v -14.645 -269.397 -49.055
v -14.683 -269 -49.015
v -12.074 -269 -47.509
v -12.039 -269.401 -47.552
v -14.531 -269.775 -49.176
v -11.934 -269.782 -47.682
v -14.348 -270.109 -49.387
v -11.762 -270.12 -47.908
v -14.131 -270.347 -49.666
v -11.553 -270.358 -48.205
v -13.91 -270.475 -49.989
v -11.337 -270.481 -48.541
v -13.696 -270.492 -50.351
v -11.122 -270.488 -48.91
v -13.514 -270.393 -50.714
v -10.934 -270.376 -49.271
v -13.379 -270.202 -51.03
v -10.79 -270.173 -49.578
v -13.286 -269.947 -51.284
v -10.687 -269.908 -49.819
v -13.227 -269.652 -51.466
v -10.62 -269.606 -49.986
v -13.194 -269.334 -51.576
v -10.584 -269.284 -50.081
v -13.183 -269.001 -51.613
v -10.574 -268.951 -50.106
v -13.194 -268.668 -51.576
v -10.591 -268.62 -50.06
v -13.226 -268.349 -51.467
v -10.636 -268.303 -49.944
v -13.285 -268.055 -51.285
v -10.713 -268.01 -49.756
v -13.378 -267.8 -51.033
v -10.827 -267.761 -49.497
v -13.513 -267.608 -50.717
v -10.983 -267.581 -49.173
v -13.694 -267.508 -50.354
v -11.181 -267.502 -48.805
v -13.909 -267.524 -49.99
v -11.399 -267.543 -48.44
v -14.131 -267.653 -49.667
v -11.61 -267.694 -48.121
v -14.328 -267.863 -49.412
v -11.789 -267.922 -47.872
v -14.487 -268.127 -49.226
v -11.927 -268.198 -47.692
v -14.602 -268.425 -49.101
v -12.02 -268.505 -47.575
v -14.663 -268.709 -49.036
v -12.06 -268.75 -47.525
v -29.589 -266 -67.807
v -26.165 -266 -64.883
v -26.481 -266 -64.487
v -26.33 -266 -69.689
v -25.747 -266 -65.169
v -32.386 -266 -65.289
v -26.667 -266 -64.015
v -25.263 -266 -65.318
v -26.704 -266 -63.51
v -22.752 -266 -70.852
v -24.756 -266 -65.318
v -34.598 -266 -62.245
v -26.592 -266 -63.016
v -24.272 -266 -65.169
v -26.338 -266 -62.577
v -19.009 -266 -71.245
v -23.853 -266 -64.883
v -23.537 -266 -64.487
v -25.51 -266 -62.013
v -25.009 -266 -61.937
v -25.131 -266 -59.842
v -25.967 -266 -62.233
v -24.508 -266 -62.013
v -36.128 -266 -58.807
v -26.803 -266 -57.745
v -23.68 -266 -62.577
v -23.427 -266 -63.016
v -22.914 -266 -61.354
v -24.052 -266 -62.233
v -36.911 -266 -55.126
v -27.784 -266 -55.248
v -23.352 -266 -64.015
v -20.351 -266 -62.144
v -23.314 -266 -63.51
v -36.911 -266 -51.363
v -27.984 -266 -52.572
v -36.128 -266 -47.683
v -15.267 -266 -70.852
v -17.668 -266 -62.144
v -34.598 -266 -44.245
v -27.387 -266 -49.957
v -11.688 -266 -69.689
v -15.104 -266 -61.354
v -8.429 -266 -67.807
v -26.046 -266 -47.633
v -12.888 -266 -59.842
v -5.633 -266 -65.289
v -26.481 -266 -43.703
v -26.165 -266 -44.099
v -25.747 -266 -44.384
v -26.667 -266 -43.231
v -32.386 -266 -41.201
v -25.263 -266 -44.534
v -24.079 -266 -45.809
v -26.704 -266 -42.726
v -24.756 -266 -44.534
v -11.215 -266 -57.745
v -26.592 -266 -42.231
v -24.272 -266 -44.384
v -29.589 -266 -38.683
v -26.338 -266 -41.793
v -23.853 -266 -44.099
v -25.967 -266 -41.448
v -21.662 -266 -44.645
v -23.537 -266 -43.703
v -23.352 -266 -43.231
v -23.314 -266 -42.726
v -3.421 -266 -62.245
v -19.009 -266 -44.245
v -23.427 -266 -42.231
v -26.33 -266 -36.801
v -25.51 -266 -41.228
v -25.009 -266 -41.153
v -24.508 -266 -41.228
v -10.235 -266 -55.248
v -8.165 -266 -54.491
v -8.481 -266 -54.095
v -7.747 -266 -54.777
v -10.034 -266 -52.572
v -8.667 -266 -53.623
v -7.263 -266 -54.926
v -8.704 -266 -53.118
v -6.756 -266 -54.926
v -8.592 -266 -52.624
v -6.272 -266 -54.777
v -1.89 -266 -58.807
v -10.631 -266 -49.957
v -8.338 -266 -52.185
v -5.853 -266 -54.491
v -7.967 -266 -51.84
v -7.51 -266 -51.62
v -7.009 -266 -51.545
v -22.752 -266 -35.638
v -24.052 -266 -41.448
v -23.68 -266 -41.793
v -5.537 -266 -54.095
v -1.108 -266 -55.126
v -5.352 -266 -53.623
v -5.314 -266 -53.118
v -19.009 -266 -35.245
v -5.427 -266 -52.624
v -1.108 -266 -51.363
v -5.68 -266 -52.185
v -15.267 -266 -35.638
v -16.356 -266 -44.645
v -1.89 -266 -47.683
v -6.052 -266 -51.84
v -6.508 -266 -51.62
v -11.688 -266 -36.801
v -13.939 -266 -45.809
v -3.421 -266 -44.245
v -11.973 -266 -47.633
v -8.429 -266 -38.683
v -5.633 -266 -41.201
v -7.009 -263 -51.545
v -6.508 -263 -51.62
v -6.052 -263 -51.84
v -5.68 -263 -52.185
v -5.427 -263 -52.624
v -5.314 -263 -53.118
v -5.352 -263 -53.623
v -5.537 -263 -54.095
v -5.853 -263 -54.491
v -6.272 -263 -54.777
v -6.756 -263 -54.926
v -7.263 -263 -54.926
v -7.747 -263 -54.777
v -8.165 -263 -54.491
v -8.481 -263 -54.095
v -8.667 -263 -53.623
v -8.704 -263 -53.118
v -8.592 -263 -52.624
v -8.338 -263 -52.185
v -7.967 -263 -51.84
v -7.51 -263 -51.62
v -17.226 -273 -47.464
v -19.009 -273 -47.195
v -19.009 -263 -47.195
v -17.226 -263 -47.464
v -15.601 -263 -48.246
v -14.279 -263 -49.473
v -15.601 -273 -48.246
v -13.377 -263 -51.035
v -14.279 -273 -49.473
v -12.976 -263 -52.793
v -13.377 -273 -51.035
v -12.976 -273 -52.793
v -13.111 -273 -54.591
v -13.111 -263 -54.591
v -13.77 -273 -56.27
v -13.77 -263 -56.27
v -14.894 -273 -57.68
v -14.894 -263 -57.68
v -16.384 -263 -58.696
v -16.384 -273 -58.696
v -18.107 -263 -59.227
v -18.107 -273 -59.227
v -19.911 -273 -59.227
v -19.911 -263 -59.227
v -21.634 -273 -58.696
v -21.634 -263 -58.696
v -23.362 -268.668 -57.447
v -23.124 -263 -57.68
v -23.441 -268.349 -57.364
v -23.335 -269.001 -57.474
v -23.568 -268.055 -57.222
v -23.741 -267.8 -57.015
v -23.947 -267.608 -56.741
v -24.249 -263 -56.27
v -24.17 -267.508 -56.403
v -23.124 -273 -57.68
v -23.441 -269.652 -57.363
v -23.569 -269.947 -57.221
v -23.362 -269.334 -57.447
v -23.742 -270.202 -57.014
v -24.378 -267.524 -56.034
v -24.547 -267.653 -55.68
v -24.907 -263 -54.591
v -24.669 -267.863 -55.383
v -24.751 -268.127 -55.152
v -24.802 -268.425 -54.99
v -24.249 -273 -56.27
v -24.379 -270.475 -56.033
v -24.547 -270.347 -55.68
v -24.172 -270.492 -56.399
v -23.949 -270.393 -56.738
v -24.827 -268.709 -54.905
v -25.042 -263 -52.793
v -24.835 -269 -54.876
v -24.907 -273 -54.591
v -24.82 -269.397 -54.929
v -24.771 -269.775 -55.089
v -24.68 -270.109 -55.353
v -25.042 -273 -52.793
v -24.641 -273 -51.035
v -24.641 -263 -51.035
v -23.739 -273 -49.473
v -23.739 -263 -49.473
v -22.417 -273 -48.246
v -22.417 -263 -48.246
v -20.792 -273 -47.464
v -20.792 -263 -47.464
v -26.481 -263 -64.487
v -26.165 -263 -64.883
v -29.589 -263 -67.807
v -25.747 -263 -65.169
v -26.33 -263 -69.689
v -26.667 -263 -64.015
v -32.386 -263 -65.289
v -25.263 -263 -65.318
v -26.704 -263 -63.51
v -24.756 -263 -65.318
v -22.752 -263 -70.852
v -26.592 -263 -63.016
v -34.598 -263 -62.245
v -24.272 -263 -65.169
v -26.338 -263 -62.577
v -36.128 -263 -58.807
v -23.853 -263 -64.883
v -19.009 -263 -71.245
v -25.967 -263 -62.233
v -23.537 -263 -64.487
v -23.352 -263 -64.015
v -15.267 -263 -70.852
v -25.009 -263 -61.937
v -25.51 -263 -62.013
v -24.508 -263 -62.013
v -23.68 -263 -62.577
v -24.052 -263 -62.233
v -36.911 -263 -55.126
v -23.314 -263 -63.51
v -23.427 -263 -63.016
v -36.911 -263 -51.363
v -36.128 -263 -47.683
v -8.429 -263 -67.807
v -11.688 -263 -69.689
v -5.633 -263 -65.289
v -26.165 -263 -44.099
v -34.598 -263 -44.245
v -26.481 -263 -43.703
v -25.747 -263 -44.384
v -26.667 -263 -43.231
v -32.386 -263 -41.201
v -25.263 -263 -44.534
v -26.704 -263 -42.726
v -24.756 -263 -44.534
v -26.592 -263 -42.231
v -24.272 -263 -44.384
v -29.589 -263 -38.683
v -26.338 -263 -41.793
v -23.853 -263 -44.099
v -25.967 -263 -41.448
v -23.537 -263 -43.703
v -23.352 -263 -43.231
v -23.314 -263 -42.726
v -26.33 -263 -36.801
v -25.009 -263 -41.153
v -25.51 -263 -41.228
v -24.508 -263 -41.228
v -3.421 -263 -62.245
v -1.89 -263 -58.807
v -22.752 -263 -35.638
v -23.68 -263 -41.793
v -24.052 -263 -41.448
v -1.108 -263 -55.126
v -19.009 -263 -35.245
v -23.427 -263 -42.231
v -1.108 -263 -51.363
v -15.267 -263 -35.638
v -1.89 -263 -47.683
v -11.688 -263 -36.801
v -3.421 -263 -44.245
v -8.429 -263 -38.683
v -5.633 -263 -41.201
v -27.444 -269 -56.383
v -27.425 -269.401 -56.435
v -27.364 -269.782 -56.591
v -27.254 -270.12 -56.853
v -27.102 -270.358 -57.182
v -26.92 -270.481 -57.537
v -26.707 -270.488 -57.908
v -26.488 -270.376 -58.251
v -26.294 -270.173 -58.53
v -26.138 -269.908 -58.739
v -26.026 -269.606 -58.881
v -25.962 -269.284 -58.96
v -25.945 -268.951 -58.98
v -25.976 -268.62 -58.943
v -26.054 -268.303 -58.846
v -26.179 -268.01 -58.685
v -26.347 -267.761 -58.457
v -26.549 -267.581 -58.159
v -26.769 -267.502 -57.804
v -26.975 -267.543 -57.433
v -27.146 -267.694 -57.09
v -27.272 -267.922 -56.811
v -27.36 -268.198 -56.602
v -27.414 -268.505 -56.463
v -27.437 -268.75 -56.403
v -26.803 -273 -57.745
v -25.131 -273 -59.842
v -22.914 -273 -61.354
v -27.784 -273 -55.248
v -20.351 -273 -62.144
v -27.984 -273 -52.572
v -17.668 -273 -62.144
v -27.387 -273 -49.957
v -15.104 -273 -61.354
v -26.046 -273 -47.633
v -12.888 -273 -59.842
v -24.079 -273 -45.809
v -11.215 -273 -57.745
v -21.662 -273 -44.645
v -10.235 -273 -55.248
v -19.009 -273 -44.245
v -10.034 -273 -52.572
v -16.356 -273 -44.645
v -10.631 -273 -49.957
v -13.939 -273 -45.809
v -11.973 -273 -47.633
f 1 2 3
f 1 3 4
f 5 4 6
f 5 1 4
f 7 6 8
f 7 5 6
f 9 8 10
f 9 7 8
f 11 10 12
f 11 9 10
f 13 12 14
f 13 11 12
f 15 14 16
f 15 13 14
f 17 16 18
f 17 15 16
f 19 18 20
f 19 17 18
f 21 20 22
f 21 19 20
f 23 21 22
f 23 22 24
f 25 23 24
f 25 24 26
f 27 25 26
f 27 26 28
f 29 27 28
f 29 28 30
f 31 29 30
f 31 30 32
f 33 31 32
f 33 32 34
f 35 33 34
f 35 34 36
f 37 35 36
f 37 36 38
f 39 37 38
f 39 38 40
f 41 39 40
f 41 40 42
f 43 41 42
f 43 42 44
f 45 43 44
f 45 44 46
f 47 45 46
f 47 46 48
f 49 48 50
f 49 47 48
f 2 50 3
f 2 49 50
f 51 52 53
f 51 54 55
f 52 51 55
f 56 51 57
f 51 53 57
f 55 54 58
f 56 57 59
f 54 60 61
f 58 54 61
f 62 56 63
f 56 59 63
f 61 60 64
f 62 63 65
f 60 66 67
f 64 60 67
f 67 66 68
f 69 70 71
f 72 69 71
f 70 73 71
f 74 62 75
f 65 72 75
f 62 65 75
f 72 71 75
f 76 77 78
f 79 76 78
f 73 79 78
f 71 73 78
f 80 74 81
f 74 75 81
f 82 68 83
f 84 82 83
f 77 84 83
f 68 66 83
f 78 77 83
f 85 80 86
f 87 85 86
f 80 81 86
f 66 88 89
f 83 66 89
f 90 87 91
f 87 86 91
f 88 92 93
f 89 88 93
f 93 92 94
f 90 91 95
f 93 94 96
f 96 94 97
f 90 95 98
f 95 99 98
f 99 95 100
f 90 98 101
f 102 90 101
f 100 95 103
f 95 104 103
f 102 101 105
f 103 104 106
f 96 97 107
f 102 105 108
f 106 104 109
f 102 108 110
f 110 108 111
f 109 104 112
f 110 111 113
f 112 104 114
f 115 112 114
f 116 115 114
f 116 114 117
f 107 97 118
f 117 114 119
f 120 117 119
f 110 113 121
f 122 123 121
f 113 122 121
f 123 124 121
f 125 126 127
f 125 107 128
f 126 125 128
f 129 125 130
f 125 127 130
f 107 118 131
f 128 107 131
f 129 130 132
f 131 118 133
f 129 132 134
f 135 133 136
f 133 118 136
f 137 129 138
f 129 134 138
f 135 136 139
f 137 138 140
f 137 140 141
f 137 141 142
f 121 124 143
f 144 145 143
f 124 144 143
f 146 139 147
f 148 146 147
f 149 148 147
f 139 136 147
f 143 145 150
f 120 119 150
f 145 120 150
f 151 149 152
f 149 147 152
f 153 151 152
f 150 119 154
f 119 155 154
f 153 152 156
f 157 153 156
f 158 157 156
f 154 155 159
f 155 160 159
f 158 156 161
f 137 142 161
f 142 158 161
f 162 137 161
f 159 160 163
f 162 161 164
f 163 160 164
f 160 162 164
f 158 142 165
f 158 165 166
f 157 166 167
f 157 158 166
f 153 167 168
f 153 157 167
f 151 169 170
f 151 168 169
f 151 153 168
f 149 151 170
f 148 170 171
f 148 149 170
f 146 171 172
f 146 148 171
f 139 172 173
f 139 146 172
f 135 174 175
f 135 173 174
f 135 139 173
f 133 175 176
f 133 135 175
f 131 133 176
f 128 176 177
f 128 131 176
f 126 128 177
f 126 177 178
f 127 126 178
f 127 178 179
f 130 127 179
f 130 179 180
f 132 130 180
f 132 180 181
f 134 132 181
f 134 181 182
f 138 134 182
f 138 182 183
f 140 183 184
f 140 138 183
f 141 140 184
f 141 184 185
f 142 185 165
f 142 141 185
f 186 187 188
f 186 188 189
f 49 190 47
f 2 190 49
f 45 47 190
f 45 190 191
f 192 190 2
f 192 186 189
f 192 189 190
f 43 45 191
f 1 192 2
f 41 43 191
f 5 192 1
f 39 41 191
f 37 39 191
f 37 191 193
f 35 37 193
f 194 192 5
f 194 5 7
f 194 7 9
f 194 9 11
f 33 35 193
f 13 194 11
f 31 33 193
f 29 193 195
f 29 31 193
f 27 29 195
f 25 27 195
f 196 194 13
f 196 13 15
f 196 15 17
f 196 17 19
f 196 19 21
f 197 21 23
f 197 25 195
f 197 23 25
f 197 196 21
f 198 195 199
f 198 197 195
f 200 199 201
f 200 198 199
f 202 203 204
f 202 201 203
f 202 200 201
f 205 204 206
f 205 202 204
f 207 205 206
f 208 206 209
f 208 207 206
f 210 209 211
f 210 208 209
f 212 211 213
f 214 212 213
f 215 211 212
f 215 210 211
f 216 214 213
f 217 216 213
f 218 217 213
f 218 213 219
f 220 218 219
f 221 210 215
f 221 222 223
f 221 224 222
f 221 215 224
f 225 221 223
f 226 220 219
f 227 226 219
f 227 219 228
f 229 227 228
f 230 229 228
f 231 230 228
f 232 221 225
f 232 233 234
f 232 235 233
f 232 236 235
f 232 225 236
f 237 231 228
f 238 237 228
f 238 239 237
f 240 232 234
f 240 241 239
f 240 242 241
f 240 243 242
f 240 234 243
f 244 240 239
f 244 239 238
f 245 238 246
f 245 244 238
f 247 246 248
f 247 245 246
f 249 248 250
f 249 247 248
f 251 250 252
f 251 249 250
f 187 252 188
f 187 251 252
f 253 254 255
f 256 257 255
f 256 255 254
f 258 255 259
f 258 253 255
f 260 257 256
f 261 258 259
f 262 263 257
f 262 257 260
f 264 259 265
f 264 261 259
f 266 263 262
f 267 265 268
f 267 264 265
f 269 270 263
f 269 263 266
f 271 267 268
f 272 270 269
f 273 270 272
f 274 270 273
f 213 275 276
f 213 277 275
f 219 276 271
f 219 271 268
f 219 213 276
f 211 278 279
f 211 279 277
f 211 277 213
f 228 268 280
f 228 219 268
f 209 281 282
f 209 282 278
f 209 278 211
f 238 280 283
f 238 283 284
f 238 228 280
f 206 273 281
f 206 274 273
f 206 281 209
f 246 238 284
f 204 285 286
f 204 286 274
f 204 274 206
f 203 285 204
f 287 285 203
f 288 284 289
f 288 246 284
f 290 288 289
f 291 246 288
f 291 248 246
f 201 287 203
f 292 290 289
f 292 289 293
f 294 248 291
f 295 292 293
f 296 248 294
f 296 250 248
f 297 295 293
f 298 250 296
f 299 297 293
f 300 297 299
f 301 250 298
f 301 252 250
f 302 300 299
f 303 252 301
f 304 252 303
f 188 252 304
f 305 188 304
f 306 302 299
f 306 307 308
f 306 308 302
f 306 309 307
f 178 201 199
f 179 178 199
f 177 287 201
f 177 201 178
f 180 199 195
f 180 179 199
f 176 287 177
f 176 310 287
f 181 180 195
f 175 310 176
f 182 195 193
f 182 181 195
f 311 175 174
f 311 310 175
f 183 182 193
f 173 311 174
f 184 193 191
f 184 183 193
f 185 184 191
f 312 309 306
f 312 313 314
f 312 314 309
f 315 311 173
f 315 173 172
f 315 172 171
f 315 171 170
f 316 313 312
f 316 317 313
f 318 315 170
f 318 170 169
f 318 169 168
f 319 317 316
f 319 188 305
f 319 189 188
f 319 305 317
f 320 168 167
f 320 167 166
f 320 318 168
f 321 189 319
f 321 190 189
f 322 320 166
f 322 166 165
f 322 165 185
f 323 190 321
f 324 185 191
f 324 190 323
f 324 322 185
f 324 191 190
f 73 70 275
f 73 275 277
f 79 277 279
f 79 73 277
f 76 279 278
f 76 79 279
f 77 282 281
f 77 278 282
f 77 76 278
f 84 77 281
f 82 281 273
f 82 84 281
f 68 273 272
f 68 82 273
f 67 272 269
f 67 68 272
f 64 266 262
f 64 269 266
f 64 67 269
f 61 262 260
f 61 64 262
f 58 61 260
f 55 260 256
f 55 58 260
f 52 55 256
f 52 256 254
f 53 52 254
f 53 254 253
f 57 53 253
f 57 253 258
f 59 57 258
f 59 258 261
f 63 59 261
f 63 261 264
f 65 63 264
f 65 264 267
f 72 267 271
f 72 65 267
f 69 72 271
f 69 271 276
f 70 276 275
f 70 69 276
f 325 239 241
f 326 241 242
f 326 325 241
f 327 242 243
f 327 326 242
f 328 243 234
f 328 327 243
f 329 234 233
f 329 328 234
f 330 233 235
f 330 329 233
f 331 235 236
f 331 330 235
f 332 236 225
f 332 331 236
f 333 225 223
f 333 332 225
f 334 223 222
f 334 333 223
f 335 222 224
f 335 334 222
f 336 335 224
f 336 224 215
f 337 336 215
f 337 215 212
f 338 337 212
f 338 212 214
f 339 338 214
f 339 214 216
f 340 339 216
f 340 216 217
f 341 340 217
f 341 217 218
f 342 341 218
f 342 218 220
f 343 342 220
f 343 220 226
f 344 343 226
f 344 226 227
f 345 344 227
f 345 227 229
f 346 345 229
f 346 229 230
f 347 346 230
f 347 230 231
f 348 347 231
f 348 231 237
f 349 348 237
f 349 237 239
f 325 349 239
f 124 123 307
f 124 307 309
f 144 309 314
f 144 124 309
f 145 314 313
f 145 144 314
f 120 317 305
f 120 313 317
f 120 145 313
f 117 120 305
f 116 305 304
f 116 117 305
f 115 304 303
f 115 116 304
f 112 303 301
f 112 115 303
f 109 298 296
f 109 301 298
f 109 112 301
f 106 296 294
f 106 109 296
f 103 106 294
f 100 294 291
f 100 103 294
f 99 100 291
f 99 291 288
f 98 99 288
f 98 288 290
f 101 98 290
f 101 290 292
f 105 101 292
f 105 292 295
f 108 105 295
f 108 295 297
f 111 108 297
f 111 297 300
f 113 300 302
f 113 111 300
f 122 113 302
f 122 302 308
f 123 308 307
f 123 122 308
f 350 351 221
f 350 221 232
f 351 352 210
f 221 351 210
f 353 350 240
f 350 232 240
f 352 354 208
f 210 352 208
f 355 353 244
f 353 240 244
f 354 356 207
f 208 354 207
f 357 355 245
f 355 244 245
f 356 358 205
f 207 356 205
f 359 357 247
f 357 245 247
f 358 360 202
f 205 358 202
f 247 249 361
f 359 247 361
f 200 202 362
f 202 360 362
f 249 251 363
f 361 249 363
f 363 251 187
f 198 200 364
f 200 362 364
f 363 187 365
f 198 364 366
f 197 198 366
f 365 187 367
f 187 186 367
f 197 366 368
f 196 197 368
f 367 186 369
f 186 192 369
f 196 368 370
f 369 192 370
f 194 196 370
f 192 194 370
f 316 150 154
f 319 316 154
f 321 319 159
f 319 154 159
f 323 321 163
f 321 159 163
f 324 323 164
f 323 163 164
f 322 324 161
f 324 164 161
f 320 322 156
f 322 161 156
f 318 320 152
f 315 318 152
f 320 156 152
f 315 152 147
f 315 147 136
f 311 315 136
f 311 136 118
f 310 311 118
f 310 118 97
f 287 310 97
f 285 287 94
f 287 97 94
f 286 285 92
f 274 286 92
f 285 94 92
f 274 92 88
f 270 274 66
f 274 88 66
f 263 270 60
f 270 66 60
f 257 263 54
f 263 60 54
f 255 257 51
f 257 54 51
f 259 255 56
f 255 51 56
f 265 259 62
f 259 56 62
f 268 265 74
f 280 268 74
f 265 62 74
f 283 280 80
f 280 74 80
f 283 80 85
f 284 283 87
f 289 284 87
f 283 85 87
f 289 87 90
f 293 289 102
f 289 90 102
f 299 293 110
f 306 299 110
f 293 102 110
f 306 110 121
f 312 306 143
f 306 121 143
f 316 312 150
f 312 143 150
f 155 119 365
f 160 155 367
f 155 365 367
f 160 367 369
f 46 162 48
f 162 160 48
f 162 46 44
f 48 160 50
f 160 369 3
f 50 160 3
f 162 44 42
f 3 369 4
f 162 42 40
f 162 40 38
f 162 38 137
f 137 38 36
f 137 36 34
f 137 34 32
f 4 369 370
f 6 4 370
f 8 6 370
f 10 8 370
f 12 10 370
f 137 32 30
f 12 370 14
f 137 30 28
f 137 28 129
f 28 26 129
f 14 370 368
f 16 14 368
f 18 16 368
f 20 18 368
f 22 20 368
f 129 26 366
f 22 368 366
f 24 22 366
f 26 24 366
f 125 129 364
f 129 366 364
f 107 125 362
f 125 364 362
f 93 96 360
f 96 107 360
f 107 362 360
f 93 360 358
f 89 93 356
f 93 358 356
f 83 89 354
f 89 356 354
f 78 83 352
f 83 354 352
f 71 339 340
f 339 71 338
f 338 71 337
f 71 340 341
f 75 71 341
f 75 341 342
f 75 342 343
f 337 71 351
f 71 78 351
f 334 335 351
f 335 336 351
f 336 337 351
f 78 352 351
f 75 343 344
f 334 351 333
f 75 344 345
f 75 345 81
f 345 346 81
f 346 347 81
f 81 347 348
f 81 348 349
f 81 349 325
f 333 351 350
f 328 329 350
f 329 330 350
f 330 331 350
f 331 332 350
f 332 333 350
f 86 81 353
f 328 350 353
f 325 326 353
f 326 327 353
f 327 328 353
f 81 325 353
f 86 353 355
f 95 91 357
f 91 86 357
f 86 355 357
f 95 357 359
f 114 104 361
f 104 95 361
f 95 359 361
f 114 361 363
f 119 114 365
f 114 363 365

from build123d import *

# Parameters (mm, degrees)
HUB_NECK_SKETCH_R                   = 9
HUB_NECK_DEPTH                      = 10
RIM_CLAMP_FLANGE_SKETCH_R           = 18
RIM_CLAMP_FLANGE_DEPTH              = 3
AXLE_CLEARANCE_SKETCH_R             = 6.05
AXLE_CLEARANCE_DEPTH                = 10.2
RIM_BOLT_CLEARANCE_PATTERN_SKETCH_R = 1.7
RIM_BOLT_CLEARANCE_PATTERN_DEPTH    = 3.2
POSITIVE_HUB_PIN_BORE_SKETCH_R      = 1.5
POSITIVE_HUB_PIN_BORE_DEPTH         = 20


with BuildPart() as part:
    # Hub neck sketch → Hub neck (new body)
    with BuildSketch(Plane(origin=(0, -273, 0), x_dir=(1, 0, 0), z_dir=(0, 1, 0))):
        with Locations(Location((-19.009182883, 53.244882879, 0), (0, 0, 270))):
            Circle(HUB_NECK_SKETCH_R)
    extrude(amount=HUB_NECK_DEPTH)

    # Rim clamp flange sketch → Rim clamp flange (add)
    with BuildSketch(Plane(origin=(0, -266, 0), x_dir=(1, 0, 0), z_dir=(0, 1, 0))):
        with Locations(Location((-19.009182883, 53.244882879, 0), (0, 0, 270))):
            Circle(RIM_CLAMP_FLANGE_SKETCH_R)
    extrude(amount=RIM_CLAMP_FLANGE_DEPTH)

    # Axle clearance sketch → Axle clearance (cut)
    with BuildSketch(Plane(origin=(0, -273.1, 0), x_dir=(1, 0, 0), z_dir=(0, 1, 0))):
        with Locations(Location((-19.009182883, 53.244882879, 0), (0, 0, 270))):
            Circle(AXLE_CLEARANCE_SKETCH_R)
    extrude(amount=AXLE_CLEARANCE_DEPTH, mode=Mode.SUBTRACT)

    # Rim bolt clearance pattern sketch → Rim bolt clearance pattern (cut)
    with BuildSketch(Plane(origin=(0, -266.1, 0), x_dir=(1, 0, 0), z_dir=(0, 1, 0))):
        with Locations(Location((-7.009182883, 53.244882879, 0), (0, 0, 270))):
            Circle(RIM_BOLT_CLEARANCE_PATTERN_SKETCH_R)
        with Locations(Location((-25.009182883, 42.852578033, 0), (0, 0, 270))):
            Circle(RIM_BOLT_CLEARANCE_PATTERN_SKETCH_R)
        with Locations(Location((-25.009182883, 63.637187724, 0), (0, 0, 270))):
            Circle(RIM_BOLT_CLEARANCE_PATTERN_SKETCH_R)
    extrude(amount=RIM_BOLT_CLEARANCE_PATTERN_DEPTH, mode=Mode.SUBTRACT)

    # Positive hub pin bore sketch → Positive hub pin bore (cut)
    with BuildSketch(Plane(origin=(-45.972851797, 0, -26.542438361), x_dir=(0.5000000000000001, 0, -0.8660254037844386), z_dir=(0.8660254037844386, 0, 0.5000000000000001))):
        with Locations(Location((36.606829753, -269, 0), (0, 0, 180))):
            Circle(POSITIVE_HUB_PIN_BORE_SKETCH_R)
    extrude(amount=POSITIVE_HUB_PIN_BORE_DEPTH, mode=Mode.SUBTRACT)


solid = part.part
